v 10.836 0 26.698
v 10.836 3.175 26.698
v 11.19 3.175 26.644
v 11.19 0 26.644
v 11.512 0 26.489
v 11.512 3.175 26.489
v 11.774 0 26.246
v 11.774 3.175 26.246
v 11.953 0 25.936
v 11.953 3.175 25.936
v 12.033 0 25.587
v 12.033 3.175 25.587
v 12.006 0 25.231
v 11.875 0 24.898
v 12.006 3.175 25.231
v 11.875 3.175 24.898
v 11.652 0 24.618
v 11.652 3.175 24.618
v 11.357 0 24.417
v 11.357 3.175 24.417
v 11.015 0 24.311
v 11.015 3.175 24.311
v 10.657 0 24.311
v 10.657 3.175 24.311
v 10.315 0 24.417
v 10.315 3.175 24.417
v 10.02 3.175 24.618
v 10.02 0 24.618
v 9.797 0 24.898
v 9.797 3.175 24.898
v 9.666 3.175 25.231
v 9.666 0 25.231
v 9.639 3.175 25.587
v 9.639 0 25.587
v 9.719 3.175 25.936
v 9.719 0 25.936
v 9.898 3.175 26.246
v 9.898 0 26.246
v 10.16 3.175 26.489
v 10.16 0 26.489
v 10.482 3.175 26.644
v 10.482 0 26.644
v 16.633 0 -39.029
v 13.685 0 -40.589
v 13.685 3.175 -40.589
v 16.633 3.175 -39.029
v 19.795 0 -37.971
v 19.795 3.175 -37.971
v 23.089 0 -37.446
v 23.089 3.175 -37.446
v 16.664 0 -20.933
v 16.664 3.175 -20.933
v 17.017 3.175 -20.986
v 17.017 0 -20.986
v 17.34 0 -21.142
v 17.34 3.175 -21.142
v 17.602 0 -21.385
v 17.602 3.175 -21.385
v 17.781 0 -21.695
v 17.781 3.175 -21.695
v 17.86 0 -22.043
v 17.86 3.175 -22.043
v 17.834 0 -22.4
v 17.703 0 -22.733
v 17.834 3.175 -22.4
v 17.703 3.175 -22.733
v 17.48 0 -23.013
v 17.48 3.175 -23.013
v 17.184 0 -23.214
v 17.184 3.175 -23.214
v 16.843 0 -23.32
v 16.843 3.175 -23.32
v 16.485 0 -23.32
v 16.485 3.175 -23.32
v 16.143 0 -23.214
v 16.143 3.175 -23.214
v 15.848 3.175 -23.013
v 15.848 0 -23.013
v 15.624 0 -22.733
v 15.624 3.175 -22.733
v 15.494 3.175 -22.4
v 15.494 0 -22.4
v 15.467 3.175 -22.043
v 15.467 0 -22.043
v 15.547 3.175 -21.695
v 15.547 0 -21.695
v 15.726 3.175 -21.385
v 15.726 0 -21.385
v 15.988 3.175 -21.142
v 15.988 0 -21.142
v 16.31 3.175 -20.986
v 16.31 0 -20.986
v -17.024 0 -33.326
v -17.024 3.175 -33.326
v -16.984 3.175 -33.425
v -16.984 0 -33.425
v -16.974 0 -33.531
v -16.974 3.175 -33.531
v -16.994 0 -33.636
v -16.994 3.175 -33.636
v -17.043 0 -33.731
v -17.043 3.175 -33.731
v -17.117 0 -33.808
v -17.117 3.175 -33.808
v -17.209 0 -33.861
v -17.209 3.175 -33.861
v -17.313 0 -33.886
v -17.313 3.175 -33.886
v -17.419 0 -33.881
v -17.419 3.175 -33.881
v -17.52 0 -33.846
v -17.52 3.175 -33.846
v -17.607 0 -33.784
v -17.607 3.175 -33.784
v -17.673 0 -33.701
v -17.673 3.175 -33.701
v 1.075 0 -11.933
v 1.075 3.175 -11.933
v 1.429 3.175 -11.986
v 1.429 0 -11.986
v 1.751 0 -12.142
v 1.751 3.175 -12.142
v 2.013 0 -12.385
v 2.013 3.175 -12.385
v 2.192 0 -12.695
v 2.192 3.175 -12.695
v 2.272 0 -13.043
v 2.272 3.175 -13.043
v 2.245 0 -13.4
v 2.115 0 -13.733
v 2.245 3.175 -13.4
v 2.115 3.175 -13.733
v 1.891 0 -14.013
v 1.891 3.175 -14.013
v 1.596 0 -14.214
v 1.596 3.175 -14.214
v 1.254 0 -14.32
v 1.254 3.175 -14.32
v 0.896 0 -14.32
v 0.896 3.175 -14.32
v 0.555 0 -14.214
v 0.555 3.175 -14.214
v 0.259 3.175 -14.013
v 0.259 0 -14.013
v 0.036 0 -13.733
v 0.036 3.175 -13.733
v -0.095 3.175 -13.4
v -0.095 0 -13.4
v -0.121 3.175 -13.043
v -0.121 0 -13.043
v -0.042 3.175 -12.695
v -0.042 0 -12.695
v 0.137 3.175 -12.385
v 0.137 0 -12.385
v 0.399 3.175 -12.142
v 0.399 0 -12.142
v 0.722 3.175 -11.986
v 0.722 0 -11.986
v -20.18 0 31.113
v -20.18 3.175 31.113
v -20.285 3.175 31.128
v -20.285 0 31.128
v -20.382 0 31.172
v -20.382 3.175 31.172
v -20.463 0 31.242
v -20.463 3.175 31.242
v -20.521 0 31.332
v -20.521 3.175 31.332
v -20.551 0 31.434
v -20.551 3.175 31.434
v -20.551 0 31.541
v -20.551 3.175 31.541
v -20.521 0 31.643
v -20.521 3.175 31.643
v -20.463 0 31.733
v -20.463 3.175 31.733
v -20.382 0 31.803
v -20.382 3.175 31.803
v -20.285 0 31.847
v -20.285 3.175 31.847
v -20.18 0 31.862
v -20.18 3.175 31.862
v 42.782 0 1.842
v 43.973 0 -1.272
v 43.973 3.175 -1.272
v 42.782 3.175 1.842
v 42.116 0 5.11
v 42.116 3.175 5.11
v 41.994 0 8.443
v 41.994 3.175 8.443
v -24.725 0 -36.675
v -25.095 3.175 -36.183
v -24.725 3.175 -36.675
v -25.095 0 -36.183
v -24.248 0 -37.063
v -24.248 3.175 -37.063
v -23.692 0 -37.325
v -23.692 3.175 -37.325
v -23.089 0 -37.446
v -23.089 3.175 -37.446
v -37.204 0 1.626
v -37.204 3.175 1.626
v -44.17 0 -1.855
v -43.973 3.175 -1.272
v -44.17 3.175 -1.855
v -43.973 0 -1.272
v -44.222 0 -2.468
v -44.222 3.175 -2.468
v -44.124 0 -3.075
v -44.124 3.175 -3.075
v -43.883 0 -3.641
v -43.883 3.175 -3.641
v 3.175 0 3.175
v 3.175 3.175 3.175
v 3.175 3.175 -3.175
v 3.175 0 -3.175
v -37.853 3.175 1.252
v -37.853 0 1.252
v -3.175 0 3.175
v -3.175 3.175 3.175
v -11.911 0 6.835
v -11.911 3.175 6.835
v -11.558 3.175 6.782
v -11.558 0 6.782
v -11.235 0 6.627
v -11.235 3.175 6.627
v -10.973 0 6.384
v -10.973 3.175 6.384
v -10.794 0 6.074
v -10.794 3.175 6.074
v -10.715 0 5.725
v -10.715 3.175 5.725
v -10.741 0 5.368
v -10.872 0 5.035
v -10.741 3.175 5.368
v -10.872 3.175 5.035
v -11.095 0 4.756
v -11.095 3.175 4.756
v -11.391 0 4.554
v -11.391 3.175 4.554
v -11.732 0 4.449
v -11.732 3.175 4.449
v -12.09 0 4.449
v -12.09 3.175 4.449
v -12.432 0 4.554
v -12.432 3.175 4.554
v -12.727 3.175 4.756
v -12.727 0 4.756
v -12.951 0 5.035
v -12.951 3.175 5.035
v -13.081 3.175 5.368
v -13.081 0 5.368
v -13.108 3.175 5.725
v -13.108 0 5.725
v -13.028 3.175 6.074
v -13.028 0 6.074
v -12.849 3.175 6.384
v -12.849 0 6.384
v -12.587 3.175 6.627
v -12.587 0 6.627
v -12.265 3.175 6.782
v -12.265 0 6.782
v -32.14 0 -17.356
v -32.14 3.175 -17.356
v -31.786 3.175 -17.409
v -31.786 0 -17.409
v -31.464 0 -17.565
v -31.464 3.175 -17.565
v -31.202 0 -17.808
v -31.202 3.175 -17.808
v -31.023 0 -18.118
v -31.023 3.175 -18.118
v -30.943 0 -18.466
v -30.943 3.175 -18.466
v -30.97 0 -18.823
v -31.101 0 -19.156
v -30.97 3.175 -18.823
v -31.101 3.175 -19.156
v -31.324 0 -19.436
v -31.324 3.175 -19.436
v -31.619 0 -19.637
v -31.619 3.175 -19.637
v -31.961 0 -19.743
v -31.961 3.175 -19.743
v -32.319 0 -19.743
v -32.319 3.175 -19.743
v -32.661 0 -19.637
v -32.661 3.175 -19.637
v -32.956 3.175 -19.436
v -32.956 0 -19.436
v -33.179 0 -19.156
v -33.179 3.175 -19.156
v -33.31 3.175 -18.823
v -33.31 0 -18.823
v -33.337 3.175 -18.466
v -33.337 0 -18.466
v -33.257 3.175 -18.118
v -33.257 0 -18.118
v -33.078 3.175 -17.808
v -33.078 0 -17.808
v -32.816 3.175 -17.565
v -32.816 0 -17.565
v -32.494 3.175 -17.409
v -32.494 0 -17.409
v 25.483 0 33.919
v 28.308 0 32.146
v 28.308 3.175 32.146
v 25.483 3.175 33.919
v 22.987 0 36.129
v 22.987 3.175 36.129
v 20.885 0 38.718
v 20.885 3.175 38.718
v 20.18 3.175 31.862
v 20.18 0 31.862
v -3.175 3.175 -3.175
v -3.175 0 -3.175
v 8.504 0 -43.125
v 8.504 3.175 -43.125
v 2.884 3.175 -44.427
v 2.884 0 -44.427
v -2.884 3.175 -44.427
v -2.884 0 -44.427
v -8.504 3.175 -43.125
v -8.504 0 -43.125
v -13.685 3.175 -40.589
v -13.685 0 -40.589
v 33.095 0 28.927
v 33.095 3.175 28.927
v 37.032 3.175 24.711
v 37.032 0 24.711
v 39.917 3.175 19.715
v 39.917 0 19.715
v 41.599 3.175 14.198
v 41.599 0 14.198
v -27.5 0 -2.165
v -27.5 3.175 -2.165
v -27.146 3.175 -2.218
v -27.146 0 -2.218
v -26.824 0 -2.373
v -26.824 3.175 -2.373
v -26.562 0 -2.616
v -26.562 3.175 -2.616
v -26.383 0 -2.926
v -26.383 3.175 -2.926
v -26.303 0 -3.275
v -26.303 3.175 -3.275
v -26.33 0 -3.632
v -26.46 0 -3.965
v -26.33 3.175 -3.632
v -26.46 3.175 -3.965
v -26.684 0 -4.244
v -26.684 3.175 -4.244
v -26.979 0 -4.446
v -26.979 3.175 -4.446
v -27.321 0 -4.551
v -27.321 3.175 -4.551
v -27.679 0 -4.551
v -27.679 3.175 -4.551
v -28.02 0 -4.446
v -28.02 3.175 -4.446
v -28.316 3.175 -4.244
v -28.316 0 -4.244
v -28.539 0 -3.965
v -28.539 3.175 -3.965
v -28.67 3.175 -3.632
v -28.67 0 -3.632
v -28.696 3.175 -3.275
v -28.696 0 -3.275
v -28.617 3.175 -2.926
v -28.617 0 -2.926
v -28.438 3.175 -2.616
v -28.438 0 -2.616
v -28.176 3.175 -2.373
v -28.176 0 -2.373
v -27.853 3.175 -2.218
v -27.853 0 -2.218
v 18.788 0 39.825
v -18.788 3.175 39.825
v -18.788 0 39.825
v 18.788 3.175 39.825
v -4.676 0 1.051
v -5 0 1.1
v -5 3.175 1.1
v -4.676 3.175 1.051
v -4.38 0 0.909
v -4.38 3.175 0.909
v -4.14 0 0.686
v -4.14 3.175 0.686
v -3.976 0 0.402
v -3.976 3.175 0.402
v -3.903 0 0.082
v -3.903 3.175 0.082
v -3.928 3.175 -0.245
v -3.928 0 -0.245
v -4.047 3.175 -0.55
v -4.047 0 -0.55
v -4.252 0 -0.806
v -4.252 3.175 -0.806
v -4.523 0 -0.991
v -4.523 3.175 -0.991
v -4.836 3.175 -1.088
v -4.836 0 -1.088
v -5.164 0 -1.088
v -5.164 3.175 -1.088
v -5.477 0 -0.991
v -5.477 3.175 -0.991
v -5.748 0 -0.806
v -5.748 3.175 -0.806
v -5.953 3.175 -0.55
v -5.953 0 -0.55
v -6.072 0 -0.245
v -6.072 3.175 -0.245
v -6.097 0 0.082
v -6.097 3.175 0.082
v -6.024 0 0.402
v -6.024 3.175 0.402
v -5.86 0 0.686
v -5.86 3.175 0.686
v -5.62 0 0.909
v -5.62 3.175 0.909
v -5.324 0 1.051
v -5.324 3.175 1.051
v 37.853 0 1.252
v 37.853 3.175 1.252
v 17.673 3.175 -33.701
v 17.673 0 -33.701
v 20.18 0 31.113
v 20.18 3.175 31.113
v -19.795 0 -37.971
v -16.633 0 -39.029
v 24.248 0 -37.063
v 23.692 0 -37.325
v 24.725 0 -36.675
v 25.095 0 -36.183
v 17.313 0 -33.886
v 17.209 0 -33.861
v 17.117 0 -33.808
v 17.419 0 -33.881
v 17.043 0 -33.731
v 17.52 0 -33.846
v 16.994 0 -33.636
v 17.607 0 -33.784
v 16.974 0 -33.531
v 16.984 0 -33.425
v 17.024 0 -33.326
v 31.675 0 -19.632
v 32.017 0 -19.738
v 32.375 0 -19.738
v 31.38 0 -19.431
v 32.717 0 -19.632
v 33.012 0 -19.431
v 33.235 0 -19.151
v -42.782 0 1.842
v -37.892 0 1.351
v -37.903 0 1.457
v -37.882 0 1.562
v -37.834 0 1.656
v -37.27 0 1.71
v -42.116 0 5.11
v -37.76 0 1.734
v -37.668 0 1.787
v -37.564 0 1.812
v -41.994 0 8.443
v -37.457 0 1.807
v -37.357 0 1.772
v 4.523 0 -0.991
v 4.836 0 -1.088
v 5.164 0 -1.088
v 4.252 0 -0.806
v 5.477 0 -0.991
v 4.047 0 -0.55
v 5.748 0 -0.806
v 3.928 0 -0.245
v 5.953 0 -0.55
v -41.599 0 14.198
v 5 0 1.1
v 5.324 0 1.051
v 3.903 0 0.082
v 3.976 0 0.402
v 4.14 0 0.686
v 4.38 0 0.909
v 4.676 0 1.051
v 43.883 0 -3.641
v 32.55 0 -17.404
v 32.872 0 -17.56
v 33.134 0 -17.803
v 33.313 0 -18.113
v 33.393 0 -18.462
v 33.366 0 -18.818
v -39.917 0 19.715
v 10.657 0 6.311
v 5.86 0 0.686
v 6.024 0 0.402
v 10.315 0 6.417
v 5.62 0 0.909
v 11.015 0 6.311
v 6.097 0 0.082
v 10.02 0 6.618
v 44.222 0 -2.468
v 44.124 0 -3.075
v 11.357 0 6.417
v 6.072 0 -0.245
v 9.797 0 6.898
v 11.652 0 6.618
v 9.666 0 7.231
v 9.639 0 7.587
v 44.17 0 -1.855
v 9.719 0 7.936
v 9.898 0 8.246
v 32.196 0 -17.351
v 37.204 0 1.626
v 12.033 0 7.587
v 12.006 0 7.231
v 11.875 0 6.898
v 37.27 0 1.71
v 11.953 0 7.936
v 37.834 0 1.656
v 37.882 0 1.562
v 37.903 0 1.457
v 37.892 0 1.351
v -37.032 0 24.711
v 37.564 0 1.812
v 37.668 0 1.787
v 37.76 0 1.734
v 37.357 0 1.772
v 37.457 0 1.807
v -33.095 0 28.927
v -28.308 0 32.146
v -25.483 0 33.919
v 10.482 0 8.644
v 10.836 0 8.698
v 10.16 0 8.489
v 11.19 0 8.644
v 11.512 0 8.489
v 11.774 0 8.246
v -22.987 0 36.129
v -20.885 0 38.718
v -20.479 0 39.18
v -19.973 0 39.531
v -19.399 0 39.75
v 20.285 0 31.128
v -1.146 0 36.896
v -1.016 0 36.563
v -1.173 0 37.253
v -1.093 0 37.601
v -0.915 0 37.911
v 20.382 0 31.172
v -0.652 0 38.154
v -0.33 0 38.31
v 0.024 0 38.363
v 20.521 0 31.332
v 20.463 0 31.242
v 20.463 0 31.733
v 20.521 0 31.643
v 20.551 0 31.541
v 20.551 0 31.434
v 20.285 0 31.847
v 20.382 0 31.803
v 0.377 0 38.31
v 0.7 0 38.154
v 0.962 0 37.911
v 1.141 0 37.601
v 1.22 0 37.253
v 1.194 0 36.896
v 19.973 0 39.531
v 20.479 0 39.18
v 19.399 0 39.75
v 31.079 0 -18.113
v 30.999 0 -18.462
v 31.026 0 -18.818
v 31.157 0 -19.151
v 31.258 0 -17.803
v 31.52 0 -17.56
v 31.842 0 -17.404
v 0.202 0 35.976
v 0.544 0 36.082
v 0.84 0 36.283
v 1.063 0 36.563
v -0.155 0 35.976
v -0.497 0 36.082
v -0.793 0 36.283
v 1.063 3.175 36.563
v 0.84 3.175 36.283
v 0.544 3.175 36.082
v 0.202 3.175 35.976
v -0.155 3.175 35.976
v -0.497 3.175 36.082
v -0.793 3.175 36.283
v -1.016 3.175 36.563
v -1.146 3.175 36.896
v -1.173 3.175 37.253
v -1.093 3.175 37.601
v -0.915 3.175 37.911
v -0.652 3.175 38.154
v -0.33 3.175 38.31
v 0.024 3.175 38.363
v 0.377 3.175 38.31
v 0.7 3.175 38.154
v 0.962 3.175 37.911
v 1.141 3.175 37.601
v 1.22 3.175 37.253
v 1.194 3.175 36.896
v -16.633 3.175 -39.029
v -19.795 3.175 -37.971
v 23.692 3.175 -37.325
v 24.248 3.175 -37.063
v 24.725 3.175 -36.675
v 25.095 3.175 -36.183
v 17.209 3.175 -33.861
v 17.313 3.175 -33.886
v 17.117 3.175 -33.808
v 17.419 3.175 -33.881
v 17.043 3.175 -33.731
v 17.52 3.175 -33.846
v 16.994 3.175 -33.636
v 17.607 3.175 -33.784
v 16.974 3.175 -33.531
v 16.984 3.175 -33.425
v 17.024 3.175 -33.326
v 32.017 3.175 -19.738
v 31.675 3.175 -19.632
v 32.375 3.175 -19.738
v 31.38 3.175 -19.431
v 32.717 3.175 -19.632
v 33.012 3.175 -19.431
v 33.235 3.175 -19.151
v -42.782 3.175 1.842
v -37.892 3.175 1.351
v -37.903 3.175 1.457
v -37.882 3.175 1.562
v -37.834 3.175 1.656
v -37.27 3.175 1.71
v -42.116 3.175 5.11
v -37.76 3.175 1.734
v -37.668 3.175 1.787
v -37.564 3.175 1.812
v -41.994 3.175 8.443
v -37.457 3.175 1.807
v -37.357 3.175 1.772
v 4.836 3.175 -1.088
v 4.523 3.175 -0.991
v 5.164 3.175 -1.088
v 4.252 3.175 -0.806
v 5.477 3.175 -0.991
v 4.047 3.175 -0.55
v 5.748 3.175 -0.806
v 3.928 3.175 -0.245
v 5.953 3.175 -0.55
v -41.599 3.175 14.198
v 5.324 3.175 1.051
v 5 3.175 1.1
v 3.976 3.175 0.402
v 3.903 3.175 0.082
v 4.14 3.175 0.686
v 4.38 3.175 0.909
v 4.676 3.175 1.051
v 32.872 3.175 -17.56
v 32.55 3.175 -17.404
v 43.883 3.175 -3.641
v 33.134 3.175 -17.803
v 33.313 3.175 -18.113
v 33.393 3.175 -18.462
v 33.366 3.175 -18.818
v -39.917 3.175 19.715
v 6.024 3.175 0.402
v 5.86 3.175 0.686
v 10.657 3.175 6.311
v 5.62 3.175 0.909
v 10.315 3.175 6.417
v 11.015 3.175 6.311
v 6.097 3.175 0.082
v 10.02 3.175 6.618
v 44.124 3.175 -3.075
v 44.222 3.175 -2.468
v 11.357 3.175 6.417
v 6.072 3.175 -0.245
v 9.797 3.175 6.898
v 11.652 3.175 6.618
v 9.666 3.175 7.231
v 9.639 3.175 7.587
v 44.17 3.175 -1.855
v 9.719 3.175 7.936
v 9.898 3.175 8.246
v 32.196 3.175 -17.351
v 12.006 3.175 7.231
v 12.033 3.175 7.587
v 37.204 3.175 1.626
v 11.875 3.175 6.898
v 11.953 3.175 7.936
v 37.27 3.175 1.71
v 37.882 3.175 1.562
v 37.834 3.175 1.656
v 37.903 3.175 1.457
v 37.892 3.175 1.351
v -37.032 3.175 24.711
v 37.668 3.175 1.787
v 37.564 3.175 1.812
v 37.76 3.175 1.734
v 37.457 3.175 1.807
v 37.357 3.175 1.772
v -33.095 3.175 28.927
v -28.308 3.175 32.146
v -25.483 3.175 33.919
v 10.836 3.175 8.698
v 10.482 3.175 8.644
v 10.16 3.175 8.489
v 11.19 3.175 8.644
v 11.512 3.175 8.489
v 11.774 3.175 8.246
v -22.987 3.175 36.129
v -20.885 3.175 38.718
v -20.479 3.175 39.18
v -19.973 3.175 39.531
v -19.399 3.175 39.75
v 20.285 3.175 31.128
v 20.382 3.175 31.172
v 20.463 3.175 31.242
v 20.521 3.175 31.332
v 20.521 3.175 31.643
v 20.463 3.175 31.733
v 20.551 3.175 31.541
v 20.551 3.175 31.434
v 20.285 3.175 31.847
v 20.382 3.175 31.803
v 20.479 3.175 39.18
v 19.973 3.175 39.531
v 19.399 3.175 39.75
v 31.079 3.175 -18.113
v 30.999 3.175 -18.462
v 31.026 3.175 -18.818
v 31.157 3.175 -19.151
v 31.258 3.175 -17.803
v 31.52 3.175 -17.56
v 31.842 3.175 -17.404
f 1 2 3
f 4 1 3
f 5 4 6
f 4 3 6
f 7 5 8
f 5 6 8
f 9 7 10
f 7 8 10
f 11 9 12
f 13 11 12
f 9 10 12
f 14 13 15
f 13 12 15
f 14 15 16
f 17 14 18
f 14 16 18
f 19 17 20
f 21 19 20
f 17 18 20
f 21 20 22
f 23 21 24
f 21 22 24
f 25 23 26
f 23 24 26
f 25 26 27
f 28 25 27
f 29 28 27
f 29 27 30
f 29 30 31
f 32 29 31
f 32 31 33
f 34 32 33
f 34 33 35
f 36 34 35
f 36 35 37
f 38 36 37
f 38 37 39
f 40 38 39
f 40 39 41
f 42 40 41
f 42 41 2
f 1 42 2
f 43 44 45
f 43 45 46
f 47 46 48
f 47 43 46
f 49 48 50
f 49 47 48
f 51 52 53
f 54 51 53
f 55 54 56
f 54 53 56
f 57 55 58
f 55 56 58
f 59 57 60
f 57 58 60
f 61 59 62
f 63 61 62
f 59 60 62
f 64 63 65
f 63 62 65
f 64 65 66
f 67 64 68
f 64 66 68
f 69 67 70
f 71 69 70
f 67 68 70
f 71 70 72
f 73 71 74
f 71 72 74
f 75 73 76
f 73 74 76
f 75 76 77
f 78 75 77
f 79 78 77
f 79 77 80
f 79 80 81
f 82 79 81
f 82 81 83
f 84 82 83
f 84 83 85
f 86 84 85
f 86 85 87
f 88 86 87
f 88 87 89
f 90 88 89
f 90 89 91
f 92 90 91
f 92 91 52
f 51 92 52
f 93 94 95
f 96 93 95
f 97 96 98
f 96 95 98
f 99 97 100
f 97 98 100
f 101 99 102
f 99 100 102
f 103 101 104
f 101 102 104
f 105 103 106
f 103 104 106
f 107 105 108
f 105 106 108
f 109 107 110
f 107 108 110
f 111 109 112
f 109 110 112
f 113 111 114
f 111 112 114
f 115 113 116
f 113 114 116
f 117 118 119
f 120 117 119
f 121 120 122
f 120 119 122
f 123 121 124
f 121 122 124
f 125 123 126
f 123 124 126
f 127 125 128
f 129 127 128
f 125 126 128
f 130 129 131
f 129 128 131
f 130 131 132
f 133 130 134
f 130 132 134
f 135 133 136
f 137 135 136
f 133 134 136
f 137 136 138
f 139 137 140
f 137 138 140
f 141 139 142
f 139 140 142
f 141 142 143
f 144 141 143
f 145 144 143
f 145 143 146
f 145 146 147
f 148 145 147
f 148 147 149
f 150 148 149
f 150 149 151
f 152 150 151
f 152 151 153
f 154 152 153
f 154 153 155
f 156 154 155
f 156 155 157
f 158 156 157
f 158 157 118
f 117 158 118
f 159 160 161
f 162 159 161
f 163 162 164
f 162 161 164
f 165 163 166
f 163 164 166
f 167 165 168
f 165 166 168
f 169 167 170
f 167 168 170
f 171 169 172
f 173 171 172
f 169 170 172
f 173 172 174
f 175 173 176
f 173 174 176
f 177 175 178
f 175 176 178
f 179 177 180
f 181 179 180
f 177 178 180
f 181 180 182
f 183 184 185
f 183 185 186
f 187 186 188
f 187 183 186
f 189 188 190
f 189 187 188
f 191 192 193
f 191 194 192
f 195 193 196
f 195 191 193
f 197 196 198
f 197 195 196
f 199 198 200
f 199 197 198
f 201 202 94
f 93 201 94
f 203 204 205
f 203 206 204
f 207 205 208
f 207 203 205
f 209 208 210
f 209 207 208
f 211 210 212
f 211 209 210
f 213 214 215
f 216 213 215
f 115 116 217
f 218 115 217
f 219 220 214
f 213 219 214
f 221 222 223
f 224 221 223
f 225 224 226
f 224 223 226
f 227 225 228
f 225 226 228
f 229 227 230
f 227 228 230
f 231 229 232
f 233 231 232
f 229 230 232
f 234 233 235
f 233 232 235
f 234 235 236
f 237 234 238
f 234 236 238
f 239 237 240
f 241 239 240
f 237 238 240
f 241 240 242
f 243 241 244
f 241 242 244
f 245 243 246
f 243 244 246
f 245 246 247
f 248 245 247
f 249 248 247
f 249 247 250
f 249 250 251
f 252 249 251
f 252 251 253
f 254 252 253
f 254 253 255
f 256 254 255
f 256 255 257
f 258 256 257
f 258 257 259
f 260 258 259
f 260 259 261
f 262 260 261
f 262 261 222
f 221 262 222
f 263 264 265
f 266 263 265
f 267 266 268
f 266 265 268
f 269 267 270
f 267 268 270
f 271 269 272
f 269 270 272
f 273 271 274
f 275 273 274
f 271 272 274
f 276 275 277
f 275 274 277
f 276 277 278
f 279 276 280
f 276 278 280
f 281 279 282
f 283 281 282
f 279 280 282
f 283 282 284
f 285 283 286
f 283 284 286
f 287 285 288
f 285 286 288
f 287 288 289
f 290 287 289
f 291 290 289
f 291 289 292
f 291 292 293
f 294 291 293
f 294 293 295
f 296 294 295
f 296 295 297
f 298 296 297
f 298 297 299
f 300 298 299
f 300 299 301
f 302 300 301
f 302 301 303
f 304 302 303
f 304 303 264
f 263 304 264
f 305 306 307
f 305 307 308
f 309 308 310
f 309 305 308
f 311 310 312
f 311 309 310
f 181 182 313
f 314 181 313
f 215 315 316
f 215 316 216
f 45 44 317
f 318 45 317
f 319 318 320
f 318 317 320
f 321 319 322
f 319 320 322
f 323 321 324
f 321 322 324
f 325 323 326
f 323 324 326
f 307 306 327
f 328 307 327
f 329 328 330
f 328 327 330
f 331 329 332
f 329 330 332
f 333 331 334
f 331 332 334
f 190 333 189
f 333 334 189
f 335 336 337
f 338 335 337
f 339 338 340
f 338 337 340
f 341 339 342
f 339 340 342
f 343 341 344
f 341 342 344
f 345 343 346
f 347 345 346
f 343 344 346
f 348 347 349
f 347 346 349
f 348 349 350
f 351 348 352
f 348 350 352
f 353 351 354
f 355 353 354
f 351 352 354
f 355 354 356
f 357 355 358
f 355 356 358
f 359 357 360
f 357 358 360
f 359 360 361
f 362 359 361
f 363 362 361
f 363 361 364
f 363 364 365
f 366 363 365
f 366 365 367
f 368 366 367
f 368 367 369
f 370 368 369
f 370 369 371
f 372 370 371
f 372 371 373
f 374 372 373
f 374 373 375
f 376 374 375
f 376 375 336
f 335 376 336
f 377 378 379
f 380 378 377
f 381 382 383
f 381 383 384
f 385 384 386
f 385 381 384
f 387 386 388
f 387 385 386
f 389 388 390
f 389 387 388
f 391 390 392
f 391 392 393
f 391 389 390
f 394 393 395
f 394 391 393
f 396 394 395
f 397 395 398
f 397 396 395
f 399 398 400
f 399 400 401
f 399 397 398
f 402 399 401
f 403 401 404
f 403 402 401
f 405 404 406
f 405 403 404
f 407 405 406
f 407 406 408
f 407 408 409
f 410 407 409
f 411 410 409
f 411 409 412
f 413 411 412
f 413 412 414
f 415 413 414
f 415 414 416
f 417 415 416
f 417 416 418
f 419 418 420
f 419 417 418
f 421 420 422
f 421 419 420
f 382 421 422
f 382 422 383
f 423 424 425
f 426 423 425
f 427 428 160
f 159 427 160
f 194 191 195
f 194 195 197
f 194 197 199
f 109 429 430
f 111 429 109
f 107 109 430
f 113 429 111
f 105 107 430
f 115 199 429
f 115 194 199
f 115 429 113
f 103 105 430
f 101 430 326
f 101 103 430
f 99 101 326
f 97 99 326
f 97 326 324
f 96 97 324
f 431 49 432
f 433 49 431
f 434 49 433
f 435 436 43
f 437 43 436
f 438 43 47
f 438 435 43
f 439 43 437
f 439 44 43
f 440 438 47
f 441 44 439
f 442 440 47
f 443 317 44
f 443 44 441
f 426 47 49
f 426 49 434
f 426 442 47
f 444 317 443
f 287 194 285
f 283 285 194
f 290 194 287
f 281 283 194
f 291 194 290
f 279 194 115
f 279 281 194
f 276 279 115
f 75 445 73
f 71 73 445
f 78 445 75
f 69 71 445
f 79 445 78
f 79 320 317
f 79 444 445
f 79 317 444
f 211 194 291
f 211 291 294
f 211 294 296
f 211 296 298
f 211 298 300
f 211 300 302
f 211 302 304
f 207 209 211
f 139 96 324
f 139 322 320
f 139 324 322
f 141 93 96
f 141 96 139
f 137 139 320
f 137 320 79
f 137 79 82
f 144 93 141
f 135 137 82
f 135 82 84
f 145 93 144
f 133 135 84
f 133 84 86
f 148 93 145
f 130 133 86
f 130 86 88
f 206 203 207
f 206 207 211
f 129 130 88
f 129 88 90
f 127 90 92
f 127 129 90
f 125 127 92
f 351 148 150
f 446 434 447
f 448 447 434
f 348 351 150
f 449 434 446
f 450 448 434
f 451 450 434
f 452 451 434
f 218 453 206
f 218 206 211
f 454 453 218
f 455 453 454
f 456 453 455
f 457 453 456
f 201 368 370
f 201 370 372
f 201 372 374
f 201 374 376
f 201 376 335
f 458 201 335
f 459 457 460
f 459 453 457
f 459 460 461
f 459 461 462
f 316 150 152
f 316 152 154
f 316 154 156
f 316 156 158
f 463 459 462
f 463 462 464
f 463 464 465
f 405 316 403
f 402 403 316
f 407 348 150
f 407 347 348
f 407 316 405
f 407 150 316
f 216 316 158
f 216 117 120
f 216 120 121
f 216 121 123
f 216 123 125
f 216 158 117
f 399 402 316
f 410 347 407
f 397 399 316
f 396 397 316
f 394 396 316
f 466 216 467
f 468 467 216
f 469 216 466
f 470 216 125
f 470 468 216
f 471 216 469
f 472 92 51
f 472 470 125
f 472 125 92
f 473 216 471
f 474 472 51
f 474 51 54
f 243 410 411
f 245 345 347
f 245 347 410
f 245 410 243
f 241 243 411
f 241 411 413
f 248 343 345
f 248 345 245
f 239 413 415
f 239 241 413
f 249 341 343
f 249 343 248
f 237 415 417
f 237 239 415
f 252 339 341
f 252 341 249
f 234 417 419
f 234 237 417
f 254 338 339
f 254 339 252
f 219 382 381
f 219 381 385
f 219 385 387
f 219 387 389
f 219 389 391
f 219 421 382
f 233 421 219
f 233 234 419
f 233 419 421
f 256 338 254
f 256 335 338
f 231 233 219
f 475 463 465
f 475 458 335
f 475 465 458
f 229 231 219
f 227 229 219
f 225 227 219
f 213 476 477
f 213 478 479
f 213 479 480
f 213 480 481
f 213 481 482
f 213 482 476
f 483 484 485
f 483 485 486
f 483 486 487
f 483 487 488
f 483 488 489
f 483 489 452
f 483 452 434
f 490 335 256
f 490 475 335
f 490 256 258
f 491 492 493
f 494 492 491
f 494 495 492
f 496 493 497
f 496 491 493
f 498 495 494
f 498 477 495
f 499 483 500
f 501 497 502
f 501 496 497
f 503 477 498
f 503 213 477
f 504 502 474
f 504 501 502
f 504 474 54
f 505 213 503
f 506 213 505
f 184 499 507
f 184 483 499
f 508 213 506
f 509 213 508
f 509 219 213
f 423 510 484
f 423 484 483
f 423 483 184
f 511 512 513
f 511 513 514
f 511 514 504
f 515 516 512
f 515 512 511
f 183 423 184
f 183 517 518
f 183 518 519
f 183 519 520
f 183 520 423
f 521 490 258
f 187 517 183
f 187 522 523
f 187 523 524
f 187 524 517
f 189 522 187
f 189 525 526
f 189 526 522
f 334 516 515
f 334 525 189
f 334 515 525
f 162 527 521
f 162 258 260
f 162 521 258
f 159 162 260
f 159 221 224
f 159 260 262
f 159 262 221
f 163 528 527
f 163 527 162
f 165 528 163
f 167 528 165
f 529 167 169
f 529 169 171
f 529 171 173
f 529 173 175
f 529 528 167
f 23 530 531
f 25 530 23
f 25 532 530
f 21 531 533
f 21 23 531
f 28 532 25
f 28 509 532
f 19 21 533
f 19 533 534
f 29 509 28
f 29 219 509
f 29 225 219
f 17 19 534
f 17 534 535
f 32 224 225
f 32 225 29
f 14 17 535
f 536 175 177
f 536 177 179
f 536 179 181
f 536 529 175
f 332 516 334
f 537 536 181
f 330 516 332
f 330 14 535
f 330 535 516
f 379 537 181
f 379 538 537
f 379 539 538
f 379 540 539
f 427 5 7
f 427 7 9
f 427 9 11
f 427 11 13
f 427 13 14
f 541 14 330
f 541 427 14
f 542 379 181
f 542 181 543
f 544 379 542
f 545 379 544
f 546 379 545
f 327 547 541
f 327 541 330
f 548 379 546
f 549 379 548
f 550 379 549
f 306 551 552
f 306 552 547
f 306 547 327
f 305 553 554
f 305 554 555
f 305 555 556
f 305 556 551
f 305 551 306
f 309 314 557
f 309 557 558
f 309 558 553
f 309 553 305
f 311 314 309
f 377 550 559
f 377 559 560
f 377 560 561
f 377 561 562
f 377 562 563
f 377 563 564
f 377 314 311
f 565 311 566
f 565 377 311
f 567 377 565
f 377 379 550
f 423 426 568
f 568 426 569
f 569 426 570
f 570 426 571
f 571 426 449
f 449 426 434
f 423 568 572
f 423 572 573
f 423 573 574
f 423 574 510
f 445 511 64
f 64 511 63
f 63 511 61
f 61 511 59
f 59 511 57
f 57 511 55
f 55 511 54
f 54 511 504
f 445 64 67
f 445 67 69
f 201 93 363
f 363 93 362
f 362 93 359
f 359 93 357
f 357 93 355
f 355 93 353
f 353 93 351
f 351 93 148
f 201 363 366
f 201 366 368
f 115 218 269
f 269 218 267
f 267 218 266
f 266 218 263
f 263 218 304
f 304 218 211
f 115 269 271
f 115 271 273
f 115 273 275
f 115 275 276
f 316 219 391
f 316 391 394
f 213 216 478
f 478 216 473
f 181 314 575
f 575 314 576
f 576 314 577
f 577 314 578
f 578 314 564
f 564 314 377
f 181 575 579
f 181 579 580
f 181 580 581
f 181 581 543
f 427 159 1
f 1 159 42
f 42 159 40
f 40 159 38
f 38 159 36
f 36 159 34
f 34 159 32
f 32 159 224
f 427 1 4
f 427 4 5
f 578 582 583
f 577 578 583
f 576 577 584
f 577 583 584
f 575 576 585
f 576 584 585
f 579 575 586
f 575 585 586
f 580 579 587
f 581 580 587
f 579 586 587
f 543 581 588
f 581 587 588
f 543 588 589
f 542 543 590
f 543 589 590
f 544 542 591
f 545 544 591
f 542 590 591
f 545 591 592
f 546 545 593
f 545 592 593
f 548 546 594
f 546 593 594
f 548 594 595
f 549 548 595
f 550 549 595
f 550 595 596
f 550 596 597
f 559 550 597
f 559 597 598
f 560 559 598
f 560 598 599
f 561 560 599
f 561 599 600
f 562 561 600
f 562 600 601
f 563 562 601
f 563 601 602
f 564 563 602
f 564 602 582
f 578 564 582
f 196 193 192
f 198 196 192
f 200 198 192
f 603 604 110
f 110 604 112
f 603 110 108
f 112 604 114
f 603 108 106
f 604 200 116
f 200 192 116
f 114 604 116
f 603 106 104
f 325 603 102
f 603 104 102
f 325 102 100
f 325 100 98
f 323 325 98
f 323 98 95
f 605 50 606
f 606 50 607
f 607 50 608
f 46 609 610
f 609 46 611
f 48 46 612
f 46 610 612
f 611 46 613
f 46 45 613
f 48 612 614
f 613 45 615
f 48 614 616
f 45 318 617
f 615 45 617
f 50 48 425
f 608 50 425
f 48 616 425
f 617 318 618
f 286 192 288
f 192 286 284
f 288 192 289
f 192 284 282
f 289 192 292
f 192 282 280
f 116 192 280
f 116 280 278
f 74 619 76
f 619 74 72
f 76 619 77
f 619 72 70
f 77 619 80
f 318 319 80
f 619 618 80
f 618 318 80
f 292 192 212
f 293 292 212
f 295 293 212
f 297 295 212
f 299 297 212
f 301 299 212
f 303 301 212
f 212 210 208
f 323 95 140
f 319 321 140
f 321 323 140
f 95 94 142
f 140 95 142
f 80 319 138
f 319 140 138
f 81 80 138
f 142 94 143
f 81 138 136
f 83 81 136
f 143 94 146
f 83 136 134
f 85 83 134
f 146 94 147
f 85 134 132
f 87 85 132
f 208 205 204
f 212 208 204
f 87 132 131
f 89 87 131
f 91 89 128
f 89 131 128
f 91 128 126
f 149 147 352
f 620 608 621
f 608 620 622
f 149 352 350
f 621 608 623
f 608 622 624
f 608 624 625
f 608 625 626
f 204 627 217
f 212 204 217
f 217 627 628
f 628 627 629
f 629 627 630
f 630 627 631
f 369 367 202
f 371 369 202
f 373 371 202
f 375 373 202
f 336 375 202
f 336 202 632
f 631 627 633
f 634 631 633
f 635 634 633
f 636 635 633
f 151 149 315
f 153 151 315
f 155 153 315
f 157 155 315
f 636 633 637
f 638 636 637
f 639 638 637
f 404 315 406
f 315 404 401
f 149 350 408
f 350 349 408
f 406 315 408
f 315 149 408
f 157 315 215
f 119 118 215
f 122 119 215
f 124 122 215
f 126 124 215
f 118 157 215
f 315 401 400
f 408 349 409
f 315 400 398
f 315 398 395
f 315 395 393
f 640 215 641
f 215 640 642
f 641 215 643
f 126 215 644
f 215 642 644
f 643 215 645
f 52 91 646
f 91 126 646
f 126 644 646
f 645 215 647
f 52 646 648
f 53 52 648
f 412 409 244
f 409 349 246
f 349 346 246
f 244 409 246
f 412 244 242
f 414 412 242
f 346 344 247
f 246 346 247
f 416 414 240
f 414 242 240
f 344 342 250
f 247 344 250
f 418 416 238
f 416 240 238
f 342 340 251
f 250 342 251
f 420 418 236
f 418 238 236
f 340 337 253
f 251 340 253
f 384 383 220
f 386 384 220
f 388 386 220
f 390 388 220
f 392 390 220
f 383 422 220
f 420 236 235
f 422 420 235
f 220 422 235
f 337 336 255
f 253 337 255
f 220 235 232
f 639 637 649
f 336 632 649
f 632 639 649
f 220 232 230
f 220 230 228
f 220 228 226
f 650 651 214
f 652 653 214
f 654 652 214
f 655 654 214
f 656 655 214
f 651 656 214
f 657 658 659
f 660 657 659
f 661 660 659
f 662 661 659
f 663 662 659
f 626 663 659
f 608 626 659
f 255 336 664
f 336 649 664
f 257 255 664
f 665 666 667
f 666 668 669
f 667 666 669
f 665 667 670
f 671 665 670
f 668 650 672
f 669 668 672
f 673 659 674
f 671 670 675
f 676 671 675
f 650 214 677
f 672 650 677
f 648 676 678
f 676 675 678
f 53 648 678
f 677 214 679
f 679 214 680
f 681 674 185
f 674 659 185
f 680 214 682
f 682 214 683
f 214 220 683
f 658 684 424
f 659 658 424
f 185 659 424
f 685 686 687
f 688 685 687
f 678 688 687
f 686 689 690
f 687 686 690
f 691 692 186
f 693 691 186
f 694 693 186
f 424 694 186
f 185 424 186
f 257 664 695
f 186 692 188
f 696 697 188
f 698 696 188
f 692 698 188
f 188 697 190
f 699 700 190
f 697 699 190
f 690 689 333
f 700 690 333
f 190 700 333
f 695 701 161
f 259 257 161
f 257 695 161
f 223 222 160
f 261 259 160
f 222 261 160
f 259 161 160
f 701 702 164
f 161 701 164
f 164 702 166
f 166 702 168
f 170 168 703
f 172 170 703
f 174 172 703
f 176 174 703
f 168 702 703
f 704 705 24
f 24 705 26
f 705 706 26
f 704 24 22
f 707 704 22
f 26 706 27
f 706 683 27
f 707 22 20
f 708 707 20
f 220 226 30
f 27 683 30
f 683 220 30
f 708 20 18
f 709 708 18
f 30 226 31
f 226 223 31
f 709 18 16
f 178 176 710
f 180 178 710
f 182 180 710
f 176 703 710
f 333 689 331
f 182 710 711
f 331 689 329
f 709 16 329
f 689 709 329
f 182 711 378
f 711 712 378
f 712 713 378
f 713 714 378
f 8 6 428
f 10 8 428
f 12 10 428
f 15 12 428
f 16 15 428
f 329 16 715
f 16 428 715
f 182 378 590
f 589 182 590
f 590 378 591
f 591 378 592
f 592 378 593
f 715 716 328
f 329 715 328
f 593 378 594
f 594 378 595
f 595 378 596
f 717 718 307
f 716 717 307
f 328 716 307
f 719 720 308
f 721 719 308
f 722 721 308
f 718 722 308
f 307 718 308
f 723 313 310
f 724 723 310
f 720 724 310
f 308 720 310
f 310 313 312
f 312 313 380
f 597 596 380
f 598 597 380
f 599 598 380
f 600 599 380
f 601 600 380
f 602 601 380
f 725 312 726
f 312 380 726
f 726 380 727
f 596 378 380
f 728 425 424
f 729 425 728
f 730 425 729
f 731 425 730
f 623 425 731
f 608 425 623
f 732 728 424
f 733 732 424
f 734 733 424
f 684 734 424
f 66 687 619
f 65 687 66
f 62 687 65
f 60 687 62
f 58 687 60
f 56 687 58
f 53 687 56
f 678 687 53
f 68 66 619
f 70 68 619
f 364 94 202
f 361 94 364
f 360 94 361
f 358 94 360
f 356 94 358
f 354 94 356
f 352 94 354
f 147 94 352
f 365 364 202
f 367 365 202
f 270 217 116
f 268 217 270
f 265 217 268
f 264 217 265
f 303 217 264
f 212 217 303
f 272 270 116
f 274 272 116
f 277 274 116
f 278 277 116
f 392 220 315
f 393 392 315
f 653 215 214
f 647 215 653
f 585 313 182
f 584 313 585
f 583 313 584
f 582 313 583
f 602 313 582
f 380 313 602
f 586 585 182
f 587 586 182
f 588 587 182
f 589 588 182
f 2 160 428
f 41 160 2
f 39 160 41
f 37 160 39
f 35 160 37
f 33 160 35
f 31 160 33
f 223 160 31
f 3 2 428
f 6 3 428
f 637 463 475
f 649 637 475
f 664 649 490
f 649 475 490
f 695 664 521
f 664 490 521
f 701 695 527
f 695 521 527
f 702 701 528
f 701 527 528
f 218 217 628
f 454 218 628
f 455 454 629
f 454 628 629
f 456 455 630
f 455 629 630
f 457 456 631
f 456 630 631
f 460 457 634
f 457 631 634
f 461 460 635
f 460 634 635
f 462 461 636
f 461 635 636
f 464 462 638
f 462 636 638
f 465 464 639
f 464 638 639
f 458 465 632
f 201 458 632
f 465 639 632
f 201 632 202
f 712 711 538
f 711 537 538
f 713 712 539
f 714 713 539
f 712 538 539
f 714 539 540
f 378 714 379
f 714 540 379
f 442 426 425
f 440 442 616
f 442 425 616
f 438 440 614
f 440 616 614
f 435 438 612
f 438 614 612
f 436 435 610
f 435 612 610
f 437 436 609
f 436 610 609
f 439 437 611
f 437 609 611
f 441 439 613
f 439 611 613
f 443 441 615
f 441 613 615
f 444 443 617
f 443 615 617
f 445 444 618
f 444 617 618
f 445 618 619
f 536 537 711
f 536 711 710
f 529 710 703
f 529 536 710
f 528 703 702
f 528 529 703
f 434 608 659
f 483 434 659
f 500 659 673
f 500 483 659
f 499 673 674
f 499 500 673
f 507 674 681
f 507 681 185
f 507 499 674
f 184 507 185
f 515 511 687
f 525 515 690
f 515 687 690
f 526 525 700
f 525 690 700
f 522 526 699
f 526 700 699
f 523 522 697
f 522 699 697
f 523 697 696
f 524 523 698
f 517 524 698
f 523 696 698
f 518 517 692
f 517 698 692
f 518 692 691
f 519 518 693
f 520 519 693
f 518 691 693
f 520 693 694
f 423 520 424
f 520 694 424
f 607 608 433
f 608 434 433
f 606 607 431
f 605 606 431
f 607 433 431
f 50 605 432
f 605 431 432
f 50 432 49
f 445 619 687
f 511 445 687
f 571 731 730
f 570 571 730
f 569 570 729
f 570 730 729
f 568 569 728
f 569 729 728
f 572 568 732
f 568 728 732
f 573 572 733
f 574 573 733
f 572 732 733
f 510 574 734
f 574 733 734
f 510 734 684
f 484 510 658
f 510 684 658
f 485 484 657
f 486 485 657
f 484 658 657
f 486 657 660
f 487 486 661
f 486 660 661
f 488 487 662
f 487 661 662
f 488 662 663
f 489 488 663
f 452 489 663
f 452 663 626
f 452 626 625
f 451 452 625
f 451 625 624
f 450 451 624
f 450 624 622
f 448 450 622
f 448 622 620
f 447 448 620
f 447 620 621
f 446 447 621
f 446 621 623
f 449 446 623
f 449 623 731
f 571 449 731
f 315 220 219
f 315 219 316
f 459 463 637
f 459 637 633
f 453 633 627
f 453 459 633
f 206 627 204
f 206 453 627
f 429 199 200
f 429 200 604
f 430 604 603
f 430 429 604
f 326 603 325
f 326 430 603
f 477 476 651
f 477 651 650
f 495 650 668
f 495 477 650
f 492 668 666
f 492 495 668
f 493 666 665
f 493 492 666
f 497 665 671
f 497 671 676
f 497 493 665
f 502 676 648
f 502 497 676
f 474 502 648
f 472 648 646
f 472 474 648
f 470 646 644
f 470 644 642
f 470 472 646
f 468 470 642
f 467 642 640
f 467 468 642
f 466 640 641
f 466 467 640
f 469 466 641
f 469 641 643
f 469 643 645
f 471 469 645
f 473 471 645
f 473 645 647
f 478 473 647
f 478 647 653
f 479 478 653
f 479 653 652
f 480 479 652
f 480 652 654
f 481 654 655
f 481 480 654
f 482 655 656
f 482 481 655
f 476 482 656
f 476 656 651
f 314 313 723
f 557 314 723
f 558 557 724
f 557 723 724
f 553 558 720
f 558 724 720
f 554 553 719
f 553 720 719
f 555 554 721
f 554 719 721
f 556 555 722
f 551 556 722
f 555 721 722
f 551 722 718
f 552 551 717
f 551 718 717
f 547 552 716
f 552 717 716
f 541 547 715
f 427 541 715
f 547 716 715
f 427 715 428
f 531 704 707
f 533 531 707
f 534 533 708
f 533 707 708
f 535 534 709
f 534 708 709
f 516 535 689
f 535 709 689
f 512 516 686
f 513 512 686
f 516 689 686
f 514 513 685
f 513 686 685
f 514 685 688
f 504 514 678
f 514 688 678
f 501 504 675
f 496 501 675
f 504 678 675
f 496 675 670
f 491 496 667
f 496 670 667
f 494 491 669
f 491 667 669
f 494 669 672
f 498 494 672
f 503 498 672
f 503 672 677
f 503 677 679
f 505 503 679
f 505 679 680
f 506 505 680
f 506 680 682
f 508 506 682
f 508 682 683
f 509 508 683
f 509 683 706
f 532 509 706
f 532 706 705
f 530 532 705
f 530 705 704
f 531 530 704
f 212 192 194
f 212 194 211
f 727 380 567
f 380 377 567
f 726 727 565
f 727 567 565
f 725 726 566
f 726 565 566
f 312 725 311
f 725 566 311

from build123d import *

# Parameters (mm, degrees)
SKETCH4_R           = 1.0999978
BOSS_EXTRUDE4_DEPTH = 3.175
SKETCH1_R           = 1.1999976
CUT_EXTRUDE7_DEPTH  = 62.35209393
CUT_EXTRUDE9_DEPTH  = 62.35209393
CIRPATTERN1_COUNT   = 3
SKETCH9_W           = 40.35933
SKETCH9_H           = 5.08
BOSS_EXTRUDE5_DEPTH = 3.175
SKETCH10_R          = 1.2
CUT_EXTRUDE10_DEPTH = 64.132493246
CIRPATTERN2_COUNT   = 3
FILLET3_R           = 20.32
FILLET4_R           = 2.54
SKETCH13_W          = 6.35
SKETCH13_H          = 6.35
CUT_EXTRUDE12_DEPTH = 63.881962359


with BuildPart() as part:
    # Sketch4 → Boss-Extrude4 (new body)
    with BuildSketch(Plane(origin=(0, 0, 0), x_dir=(1, 0, 0), z_dir=(0, 1, 0))):
        with BuildLine():
            Line((-19.99996, 34.84845233), (-40.179625, -0.10375273))
            ThreePointArc((-40.179625, -0.10375273), (-38.616778752, -22.295407608), (-20.179665, -34.744699599))
            Line((-20.179665, -34.744699599), (0, -34.744699599))
            Line((0, -34.744699599), (20.179665, -34.744699599))
            ThreePointArc((20.179665, -34.744699599), (38.616778752, -22.295407608), (40.179625, -0.10375273))
            Line((40.179625, -0.10375273), (30.0897925, 17.3723498))
            Line((30.0897925, 17.3723498), (19.99996, 34.84845233))
            ThreePointArc((19.99996, 34.84845233), (0, 44.590815215), (-19.99996, 34.84845233))
        make_face()
        with Locations(Location((-5.000000033, 0, 0), (0, 0, 270))):
            Circle(SKETCH4_R, mode=Mode.SUBTRACT)
        with Locations(Location((5.000000033, 0, 0), (0, 0, 270))):
            Circle(SKETCH4_R, mode=Mode.SUBTRACT)
    extrude(amount=BOSS_EXTRUDE4_DEPTH)

    # Sketch1 → Cut-Extrude7 (cut, through all)
    with BuildSketch(Plane(origin=(0, 3.175, 0), x_dir=(1, 0, 0), z_dir=(0, 1, 0))):
        with Locations(Location((10.835999918, -25.497765942, 0), (0, 0, 270))):
            Circle(SKETCH1_R)
        with Locations(Location((10.835999918, -7.497801942, 0), (0, 0, 270))):
            Circle(SKETCH1_R)
        with Locations(Location((-11.911286913, -5.635350233, 0), (0, 0, 270))):
            Circle(SKETCH1_R)
        with Locations(Location((-27.499713005, 3.364631767, 0), (0, 0, 270))):
            Circle(SKETCH1_R)
        with Locations(Location((1.075286995, 13.133152175, 0), (0, 0, 270))):
            Circle(SKETCH1_R)
        with Locations(Location((16.663713087, 22.133134175, 0), (0, 0, 270))):
            Circle(SKETCH1_R)
    extrude(amount=-CUT_EXTRUDE7_DEPTH, mode=Mode.SUBTRACT)

    # Sketch6 → Cut-Extrude9 (cut, through all)
    with BuildSketch(Plane(origin=(0, 3.175, 0), x_dir=(1, 0, 0), z_dir=(0, 1, 0))):
        with BuildLine():
            Line((-20.179665, -31.862440942), (20.179665, -31.862440942))
            ThreePointArc((20.179665, -31.862440942), (20.554442, -31.487663942), (20.179665, -31.112886942))
            Line((20.179665, -31.112886942), (-20.179665, -31.112886942))
            ThreePointArc((-20.179665, -31.112886942), (-20.554442, -31.487663942), (-20.179665, -31.862440942))
        make_face()
    cut_extrude9 = extrude(amount=-CUT_EXTRUDE9_DEPTH, mode=Mode.SUBTRACT)

    # CirPattern1: Cut-Extrude9 ×3 about axis
    cirpattern1_axis = Axis((0, 0, -0.195474675), (0, 1, 0))
    for i in range(1, CIRPATTERN1_COUNT):
        add(cut_extrude9.rotate(cirpattern1_axis, i * 360 / CIRPATTERN1_COUNT), mode=Mode.SUBTRACT)

    # Sketch9 → Boss-Extrude5 (add)
    with BuildSketch(Plane(origin=(0, 3.175, 0), x_dir=(1, 0, 0), z_dir=(0, 1, 0))):
        Polygon((-19.99996, 34.84845233), (-24.399369051, 37.38845233), (-44.579034051, 2.43624727), (-40.179625, -0.10375273), align=None)
        with Locations((0, -37.284699599)):
            Rectangle(SKETCH9_W, SKETCH9_H)
        Polygon((19.99996, 34.84845233), (24.399369051, 37.38845233), (44.579034051, 2.43624727), (40.179625, -0.10375273), align=None)
    extrude(amount=-BOSS_EXTRUDE5_DEPTH)

    # Sketch10 → Cut-Extrude10 (cut, through all)
    with BuildSketch(Plane(origin=(0, 3.175, 0), x_dir=(1, 0, 0), z_dir=(0, 1, 0))):
        with Locations(Location((-32.140098419, 18.556094474, 0), (0, 0, 270))):
            Circle(SKETCH10_R)
    cut_extrude10 = extrude(amount=-CUT_EXTRUDE10_DEPTH, mode=Mode.SUBTRACT)

    # CirPattern2: Cut-Extrude10 ×3 about axis
    cirpattern2_axis = Axis((0.026468548, 0, 0.018558184), (0, 1, 0))
    for i in range(1, CIRPATTERN2_COUNT):
        add(cut_extrude10.rotate(cirpattern2_axis, i * 360 / CIRPATTERN2_COUNT), mode=Mode.SUBTRACT)

    # Fillet3
    # the kernel refuses this fillet: 20.32 mm, written as the material it adds along each edge
    with BuildSketch(Plane(origin=(-19.99996, 0, -34.84845233), x_dir=(0.7399559261961443, 0, -0.6726553555032522), z_dir=(0, 1, 0)), Plane(origin=(-20.179665, 0, 34.744699599), x_dir=(-0.9525145889555402, 0, -0.3044929520150809), z_dir=(0, 1, 0))) as fillet3_piece_1:
        with BuildLine():
            CenterArc((11.947307306, 20.031233261), FILLET3_R, 228.388118158, 31.941023553)
            Line((-1.546824196, 4.838774112), (-1.816706826, 4.534924929))
            ThreePointArc((-1.816706826, 4.534924929), (-1.160514027, 2.29564112), (-0.387101929, -0.123745936))
            Line((-0.387101929, -0.123745936), (0.068270327, -0.400624665))
            ThreePointArc((0.068270327, -0.400624665), (4.266895466, -0.045441577), (8.465520605, -0.400624665))
            Line((8.465520605, -0.400624665), (8.533790933, 0))
        make_face()
    extrude(amount=3.175)
    with BuildSketch(Plane(origin=(19.99996, 0, -34.84845233), x_dir=(-0.7399559261961431, 0, -0.6726553555032532), z_dir=(0, 1, 0)), Plane(origin=(20.179665, 0, 34.744699599), x_dir=(0.9525145889555428, 0, -0.3044929520150728), z_dir=(0, 1, 0))) as fillet3_piece_2:
        with BuildLine():
            CenterArc((11.947307306, -20.031233261), FILLET3_R, 99.67085829, 31.941023553)
            Line((-1.546824196, -4.838774112), (-1.816706826, -4.534924929))
            ThreePointArc((-1.816706826, -4.534924929), (-1.160514027, -2.29564112), (-0.387101929, 0.123745936))
            Line((-0.387101929, 0.123745936), (0.068270327, 0.400624665))
            ThreePointArc((0.068270327, 0.400624665), (4.266895466, 0.045441577), (8.465520605, 0.400624665))
            Line((8.465520605, 0.400624665), (8.533790933, 0))
        make_face()
    extrude(amount=3.175)
    with BuildSketch(Plane(origin=(40.179625, 0, 0.10375273), x_dir=(0.8660254037844389, 0, -0.4999999999999995), z_dir=(0, 1, 0))) as fillet3_piece_3:
        with BuildLine():
            CenterArc((15.442171046, -17.479353856), FILLET3_R, 120.660456863, 31.941023553)
            Line((-2.598479193, -8.128560362), (-2.959292198, -7.941544493))
            ThreePointArc((-2.959292198, -7.941544493), (-1.342523361, -4.050443541), (-0.402388672, 0.056958904))
            Line((-0.402388672, 0.056958904), (0, 0.4064))
            ThreePointArc((0, 0.4064), (2.54, 0.4064), (4.872756579, 0.349587077))
            Line((4.872756579, 0.349587077), (5.08, 0))
        make_face()
    extrude(amount=3.175)
    with BuildSketch(Plane(origin=(-40.179625, 0, 0.10375273), x_dir=(-0.8660254037844382, 0, -0.500000000000001), z_dir=(0, 1, 0))) as fillet3_piece_4:
        with BuildLine():
            CenterArc((15.442171046, 17.479353856), FILLET3_R, 207.398519584, 31.941023553)
            Line((-2.598479193, 8.128560362), (-2.959292198, 7.941544493))
            ThreePointArc((-2.959292198, 7.941544493), (-1.342523361, 4.050443541), (-0.402388672, -0.056958904))
            Line((-0.402388672, -0.056958904), (0, -0.4064))
            ThreePointArc((0, -0.4064), (2.54, -0.4064), (4.872756579, -0.349587077))
            Line((4.872756579, -0.349587077), (5.08, 0))
        make_face()
    extrude(amount=3.175)

    # Fillet4
    fillet4_edges = [part.edges().sort_by_distance(p)[0] for p in [
        (-44.579034051, 1.5875, -2.43624727),
        (-24.399369051, 1.5875, -37.38845233),
        (20.179665, 1.5875, 39.824699599),
        (-20.179665, 1.5875, 39.824699599),
        (24.399369051, 1.5875, -37.38845233),
        (44.579034051, 1.5875, -2.43624727),
    ]]
    fillet(fillet4_edges, radius=FILLET4_R)

    # Sketch13 → Cut-Extrude12 (cut, through all)
    with BuildSketch(Plane(origin=(0, 3.175, 0), x_dir=(1, 0, 0), z_dir=(0, 1, 0))):
        Rectangle(SKETCH13_W, SKETCH13_H)
    extrude(amount=-CUT_EXTRUDE12_DEPTH, mode=Mode.SUBTRACT)


solid = part.part
